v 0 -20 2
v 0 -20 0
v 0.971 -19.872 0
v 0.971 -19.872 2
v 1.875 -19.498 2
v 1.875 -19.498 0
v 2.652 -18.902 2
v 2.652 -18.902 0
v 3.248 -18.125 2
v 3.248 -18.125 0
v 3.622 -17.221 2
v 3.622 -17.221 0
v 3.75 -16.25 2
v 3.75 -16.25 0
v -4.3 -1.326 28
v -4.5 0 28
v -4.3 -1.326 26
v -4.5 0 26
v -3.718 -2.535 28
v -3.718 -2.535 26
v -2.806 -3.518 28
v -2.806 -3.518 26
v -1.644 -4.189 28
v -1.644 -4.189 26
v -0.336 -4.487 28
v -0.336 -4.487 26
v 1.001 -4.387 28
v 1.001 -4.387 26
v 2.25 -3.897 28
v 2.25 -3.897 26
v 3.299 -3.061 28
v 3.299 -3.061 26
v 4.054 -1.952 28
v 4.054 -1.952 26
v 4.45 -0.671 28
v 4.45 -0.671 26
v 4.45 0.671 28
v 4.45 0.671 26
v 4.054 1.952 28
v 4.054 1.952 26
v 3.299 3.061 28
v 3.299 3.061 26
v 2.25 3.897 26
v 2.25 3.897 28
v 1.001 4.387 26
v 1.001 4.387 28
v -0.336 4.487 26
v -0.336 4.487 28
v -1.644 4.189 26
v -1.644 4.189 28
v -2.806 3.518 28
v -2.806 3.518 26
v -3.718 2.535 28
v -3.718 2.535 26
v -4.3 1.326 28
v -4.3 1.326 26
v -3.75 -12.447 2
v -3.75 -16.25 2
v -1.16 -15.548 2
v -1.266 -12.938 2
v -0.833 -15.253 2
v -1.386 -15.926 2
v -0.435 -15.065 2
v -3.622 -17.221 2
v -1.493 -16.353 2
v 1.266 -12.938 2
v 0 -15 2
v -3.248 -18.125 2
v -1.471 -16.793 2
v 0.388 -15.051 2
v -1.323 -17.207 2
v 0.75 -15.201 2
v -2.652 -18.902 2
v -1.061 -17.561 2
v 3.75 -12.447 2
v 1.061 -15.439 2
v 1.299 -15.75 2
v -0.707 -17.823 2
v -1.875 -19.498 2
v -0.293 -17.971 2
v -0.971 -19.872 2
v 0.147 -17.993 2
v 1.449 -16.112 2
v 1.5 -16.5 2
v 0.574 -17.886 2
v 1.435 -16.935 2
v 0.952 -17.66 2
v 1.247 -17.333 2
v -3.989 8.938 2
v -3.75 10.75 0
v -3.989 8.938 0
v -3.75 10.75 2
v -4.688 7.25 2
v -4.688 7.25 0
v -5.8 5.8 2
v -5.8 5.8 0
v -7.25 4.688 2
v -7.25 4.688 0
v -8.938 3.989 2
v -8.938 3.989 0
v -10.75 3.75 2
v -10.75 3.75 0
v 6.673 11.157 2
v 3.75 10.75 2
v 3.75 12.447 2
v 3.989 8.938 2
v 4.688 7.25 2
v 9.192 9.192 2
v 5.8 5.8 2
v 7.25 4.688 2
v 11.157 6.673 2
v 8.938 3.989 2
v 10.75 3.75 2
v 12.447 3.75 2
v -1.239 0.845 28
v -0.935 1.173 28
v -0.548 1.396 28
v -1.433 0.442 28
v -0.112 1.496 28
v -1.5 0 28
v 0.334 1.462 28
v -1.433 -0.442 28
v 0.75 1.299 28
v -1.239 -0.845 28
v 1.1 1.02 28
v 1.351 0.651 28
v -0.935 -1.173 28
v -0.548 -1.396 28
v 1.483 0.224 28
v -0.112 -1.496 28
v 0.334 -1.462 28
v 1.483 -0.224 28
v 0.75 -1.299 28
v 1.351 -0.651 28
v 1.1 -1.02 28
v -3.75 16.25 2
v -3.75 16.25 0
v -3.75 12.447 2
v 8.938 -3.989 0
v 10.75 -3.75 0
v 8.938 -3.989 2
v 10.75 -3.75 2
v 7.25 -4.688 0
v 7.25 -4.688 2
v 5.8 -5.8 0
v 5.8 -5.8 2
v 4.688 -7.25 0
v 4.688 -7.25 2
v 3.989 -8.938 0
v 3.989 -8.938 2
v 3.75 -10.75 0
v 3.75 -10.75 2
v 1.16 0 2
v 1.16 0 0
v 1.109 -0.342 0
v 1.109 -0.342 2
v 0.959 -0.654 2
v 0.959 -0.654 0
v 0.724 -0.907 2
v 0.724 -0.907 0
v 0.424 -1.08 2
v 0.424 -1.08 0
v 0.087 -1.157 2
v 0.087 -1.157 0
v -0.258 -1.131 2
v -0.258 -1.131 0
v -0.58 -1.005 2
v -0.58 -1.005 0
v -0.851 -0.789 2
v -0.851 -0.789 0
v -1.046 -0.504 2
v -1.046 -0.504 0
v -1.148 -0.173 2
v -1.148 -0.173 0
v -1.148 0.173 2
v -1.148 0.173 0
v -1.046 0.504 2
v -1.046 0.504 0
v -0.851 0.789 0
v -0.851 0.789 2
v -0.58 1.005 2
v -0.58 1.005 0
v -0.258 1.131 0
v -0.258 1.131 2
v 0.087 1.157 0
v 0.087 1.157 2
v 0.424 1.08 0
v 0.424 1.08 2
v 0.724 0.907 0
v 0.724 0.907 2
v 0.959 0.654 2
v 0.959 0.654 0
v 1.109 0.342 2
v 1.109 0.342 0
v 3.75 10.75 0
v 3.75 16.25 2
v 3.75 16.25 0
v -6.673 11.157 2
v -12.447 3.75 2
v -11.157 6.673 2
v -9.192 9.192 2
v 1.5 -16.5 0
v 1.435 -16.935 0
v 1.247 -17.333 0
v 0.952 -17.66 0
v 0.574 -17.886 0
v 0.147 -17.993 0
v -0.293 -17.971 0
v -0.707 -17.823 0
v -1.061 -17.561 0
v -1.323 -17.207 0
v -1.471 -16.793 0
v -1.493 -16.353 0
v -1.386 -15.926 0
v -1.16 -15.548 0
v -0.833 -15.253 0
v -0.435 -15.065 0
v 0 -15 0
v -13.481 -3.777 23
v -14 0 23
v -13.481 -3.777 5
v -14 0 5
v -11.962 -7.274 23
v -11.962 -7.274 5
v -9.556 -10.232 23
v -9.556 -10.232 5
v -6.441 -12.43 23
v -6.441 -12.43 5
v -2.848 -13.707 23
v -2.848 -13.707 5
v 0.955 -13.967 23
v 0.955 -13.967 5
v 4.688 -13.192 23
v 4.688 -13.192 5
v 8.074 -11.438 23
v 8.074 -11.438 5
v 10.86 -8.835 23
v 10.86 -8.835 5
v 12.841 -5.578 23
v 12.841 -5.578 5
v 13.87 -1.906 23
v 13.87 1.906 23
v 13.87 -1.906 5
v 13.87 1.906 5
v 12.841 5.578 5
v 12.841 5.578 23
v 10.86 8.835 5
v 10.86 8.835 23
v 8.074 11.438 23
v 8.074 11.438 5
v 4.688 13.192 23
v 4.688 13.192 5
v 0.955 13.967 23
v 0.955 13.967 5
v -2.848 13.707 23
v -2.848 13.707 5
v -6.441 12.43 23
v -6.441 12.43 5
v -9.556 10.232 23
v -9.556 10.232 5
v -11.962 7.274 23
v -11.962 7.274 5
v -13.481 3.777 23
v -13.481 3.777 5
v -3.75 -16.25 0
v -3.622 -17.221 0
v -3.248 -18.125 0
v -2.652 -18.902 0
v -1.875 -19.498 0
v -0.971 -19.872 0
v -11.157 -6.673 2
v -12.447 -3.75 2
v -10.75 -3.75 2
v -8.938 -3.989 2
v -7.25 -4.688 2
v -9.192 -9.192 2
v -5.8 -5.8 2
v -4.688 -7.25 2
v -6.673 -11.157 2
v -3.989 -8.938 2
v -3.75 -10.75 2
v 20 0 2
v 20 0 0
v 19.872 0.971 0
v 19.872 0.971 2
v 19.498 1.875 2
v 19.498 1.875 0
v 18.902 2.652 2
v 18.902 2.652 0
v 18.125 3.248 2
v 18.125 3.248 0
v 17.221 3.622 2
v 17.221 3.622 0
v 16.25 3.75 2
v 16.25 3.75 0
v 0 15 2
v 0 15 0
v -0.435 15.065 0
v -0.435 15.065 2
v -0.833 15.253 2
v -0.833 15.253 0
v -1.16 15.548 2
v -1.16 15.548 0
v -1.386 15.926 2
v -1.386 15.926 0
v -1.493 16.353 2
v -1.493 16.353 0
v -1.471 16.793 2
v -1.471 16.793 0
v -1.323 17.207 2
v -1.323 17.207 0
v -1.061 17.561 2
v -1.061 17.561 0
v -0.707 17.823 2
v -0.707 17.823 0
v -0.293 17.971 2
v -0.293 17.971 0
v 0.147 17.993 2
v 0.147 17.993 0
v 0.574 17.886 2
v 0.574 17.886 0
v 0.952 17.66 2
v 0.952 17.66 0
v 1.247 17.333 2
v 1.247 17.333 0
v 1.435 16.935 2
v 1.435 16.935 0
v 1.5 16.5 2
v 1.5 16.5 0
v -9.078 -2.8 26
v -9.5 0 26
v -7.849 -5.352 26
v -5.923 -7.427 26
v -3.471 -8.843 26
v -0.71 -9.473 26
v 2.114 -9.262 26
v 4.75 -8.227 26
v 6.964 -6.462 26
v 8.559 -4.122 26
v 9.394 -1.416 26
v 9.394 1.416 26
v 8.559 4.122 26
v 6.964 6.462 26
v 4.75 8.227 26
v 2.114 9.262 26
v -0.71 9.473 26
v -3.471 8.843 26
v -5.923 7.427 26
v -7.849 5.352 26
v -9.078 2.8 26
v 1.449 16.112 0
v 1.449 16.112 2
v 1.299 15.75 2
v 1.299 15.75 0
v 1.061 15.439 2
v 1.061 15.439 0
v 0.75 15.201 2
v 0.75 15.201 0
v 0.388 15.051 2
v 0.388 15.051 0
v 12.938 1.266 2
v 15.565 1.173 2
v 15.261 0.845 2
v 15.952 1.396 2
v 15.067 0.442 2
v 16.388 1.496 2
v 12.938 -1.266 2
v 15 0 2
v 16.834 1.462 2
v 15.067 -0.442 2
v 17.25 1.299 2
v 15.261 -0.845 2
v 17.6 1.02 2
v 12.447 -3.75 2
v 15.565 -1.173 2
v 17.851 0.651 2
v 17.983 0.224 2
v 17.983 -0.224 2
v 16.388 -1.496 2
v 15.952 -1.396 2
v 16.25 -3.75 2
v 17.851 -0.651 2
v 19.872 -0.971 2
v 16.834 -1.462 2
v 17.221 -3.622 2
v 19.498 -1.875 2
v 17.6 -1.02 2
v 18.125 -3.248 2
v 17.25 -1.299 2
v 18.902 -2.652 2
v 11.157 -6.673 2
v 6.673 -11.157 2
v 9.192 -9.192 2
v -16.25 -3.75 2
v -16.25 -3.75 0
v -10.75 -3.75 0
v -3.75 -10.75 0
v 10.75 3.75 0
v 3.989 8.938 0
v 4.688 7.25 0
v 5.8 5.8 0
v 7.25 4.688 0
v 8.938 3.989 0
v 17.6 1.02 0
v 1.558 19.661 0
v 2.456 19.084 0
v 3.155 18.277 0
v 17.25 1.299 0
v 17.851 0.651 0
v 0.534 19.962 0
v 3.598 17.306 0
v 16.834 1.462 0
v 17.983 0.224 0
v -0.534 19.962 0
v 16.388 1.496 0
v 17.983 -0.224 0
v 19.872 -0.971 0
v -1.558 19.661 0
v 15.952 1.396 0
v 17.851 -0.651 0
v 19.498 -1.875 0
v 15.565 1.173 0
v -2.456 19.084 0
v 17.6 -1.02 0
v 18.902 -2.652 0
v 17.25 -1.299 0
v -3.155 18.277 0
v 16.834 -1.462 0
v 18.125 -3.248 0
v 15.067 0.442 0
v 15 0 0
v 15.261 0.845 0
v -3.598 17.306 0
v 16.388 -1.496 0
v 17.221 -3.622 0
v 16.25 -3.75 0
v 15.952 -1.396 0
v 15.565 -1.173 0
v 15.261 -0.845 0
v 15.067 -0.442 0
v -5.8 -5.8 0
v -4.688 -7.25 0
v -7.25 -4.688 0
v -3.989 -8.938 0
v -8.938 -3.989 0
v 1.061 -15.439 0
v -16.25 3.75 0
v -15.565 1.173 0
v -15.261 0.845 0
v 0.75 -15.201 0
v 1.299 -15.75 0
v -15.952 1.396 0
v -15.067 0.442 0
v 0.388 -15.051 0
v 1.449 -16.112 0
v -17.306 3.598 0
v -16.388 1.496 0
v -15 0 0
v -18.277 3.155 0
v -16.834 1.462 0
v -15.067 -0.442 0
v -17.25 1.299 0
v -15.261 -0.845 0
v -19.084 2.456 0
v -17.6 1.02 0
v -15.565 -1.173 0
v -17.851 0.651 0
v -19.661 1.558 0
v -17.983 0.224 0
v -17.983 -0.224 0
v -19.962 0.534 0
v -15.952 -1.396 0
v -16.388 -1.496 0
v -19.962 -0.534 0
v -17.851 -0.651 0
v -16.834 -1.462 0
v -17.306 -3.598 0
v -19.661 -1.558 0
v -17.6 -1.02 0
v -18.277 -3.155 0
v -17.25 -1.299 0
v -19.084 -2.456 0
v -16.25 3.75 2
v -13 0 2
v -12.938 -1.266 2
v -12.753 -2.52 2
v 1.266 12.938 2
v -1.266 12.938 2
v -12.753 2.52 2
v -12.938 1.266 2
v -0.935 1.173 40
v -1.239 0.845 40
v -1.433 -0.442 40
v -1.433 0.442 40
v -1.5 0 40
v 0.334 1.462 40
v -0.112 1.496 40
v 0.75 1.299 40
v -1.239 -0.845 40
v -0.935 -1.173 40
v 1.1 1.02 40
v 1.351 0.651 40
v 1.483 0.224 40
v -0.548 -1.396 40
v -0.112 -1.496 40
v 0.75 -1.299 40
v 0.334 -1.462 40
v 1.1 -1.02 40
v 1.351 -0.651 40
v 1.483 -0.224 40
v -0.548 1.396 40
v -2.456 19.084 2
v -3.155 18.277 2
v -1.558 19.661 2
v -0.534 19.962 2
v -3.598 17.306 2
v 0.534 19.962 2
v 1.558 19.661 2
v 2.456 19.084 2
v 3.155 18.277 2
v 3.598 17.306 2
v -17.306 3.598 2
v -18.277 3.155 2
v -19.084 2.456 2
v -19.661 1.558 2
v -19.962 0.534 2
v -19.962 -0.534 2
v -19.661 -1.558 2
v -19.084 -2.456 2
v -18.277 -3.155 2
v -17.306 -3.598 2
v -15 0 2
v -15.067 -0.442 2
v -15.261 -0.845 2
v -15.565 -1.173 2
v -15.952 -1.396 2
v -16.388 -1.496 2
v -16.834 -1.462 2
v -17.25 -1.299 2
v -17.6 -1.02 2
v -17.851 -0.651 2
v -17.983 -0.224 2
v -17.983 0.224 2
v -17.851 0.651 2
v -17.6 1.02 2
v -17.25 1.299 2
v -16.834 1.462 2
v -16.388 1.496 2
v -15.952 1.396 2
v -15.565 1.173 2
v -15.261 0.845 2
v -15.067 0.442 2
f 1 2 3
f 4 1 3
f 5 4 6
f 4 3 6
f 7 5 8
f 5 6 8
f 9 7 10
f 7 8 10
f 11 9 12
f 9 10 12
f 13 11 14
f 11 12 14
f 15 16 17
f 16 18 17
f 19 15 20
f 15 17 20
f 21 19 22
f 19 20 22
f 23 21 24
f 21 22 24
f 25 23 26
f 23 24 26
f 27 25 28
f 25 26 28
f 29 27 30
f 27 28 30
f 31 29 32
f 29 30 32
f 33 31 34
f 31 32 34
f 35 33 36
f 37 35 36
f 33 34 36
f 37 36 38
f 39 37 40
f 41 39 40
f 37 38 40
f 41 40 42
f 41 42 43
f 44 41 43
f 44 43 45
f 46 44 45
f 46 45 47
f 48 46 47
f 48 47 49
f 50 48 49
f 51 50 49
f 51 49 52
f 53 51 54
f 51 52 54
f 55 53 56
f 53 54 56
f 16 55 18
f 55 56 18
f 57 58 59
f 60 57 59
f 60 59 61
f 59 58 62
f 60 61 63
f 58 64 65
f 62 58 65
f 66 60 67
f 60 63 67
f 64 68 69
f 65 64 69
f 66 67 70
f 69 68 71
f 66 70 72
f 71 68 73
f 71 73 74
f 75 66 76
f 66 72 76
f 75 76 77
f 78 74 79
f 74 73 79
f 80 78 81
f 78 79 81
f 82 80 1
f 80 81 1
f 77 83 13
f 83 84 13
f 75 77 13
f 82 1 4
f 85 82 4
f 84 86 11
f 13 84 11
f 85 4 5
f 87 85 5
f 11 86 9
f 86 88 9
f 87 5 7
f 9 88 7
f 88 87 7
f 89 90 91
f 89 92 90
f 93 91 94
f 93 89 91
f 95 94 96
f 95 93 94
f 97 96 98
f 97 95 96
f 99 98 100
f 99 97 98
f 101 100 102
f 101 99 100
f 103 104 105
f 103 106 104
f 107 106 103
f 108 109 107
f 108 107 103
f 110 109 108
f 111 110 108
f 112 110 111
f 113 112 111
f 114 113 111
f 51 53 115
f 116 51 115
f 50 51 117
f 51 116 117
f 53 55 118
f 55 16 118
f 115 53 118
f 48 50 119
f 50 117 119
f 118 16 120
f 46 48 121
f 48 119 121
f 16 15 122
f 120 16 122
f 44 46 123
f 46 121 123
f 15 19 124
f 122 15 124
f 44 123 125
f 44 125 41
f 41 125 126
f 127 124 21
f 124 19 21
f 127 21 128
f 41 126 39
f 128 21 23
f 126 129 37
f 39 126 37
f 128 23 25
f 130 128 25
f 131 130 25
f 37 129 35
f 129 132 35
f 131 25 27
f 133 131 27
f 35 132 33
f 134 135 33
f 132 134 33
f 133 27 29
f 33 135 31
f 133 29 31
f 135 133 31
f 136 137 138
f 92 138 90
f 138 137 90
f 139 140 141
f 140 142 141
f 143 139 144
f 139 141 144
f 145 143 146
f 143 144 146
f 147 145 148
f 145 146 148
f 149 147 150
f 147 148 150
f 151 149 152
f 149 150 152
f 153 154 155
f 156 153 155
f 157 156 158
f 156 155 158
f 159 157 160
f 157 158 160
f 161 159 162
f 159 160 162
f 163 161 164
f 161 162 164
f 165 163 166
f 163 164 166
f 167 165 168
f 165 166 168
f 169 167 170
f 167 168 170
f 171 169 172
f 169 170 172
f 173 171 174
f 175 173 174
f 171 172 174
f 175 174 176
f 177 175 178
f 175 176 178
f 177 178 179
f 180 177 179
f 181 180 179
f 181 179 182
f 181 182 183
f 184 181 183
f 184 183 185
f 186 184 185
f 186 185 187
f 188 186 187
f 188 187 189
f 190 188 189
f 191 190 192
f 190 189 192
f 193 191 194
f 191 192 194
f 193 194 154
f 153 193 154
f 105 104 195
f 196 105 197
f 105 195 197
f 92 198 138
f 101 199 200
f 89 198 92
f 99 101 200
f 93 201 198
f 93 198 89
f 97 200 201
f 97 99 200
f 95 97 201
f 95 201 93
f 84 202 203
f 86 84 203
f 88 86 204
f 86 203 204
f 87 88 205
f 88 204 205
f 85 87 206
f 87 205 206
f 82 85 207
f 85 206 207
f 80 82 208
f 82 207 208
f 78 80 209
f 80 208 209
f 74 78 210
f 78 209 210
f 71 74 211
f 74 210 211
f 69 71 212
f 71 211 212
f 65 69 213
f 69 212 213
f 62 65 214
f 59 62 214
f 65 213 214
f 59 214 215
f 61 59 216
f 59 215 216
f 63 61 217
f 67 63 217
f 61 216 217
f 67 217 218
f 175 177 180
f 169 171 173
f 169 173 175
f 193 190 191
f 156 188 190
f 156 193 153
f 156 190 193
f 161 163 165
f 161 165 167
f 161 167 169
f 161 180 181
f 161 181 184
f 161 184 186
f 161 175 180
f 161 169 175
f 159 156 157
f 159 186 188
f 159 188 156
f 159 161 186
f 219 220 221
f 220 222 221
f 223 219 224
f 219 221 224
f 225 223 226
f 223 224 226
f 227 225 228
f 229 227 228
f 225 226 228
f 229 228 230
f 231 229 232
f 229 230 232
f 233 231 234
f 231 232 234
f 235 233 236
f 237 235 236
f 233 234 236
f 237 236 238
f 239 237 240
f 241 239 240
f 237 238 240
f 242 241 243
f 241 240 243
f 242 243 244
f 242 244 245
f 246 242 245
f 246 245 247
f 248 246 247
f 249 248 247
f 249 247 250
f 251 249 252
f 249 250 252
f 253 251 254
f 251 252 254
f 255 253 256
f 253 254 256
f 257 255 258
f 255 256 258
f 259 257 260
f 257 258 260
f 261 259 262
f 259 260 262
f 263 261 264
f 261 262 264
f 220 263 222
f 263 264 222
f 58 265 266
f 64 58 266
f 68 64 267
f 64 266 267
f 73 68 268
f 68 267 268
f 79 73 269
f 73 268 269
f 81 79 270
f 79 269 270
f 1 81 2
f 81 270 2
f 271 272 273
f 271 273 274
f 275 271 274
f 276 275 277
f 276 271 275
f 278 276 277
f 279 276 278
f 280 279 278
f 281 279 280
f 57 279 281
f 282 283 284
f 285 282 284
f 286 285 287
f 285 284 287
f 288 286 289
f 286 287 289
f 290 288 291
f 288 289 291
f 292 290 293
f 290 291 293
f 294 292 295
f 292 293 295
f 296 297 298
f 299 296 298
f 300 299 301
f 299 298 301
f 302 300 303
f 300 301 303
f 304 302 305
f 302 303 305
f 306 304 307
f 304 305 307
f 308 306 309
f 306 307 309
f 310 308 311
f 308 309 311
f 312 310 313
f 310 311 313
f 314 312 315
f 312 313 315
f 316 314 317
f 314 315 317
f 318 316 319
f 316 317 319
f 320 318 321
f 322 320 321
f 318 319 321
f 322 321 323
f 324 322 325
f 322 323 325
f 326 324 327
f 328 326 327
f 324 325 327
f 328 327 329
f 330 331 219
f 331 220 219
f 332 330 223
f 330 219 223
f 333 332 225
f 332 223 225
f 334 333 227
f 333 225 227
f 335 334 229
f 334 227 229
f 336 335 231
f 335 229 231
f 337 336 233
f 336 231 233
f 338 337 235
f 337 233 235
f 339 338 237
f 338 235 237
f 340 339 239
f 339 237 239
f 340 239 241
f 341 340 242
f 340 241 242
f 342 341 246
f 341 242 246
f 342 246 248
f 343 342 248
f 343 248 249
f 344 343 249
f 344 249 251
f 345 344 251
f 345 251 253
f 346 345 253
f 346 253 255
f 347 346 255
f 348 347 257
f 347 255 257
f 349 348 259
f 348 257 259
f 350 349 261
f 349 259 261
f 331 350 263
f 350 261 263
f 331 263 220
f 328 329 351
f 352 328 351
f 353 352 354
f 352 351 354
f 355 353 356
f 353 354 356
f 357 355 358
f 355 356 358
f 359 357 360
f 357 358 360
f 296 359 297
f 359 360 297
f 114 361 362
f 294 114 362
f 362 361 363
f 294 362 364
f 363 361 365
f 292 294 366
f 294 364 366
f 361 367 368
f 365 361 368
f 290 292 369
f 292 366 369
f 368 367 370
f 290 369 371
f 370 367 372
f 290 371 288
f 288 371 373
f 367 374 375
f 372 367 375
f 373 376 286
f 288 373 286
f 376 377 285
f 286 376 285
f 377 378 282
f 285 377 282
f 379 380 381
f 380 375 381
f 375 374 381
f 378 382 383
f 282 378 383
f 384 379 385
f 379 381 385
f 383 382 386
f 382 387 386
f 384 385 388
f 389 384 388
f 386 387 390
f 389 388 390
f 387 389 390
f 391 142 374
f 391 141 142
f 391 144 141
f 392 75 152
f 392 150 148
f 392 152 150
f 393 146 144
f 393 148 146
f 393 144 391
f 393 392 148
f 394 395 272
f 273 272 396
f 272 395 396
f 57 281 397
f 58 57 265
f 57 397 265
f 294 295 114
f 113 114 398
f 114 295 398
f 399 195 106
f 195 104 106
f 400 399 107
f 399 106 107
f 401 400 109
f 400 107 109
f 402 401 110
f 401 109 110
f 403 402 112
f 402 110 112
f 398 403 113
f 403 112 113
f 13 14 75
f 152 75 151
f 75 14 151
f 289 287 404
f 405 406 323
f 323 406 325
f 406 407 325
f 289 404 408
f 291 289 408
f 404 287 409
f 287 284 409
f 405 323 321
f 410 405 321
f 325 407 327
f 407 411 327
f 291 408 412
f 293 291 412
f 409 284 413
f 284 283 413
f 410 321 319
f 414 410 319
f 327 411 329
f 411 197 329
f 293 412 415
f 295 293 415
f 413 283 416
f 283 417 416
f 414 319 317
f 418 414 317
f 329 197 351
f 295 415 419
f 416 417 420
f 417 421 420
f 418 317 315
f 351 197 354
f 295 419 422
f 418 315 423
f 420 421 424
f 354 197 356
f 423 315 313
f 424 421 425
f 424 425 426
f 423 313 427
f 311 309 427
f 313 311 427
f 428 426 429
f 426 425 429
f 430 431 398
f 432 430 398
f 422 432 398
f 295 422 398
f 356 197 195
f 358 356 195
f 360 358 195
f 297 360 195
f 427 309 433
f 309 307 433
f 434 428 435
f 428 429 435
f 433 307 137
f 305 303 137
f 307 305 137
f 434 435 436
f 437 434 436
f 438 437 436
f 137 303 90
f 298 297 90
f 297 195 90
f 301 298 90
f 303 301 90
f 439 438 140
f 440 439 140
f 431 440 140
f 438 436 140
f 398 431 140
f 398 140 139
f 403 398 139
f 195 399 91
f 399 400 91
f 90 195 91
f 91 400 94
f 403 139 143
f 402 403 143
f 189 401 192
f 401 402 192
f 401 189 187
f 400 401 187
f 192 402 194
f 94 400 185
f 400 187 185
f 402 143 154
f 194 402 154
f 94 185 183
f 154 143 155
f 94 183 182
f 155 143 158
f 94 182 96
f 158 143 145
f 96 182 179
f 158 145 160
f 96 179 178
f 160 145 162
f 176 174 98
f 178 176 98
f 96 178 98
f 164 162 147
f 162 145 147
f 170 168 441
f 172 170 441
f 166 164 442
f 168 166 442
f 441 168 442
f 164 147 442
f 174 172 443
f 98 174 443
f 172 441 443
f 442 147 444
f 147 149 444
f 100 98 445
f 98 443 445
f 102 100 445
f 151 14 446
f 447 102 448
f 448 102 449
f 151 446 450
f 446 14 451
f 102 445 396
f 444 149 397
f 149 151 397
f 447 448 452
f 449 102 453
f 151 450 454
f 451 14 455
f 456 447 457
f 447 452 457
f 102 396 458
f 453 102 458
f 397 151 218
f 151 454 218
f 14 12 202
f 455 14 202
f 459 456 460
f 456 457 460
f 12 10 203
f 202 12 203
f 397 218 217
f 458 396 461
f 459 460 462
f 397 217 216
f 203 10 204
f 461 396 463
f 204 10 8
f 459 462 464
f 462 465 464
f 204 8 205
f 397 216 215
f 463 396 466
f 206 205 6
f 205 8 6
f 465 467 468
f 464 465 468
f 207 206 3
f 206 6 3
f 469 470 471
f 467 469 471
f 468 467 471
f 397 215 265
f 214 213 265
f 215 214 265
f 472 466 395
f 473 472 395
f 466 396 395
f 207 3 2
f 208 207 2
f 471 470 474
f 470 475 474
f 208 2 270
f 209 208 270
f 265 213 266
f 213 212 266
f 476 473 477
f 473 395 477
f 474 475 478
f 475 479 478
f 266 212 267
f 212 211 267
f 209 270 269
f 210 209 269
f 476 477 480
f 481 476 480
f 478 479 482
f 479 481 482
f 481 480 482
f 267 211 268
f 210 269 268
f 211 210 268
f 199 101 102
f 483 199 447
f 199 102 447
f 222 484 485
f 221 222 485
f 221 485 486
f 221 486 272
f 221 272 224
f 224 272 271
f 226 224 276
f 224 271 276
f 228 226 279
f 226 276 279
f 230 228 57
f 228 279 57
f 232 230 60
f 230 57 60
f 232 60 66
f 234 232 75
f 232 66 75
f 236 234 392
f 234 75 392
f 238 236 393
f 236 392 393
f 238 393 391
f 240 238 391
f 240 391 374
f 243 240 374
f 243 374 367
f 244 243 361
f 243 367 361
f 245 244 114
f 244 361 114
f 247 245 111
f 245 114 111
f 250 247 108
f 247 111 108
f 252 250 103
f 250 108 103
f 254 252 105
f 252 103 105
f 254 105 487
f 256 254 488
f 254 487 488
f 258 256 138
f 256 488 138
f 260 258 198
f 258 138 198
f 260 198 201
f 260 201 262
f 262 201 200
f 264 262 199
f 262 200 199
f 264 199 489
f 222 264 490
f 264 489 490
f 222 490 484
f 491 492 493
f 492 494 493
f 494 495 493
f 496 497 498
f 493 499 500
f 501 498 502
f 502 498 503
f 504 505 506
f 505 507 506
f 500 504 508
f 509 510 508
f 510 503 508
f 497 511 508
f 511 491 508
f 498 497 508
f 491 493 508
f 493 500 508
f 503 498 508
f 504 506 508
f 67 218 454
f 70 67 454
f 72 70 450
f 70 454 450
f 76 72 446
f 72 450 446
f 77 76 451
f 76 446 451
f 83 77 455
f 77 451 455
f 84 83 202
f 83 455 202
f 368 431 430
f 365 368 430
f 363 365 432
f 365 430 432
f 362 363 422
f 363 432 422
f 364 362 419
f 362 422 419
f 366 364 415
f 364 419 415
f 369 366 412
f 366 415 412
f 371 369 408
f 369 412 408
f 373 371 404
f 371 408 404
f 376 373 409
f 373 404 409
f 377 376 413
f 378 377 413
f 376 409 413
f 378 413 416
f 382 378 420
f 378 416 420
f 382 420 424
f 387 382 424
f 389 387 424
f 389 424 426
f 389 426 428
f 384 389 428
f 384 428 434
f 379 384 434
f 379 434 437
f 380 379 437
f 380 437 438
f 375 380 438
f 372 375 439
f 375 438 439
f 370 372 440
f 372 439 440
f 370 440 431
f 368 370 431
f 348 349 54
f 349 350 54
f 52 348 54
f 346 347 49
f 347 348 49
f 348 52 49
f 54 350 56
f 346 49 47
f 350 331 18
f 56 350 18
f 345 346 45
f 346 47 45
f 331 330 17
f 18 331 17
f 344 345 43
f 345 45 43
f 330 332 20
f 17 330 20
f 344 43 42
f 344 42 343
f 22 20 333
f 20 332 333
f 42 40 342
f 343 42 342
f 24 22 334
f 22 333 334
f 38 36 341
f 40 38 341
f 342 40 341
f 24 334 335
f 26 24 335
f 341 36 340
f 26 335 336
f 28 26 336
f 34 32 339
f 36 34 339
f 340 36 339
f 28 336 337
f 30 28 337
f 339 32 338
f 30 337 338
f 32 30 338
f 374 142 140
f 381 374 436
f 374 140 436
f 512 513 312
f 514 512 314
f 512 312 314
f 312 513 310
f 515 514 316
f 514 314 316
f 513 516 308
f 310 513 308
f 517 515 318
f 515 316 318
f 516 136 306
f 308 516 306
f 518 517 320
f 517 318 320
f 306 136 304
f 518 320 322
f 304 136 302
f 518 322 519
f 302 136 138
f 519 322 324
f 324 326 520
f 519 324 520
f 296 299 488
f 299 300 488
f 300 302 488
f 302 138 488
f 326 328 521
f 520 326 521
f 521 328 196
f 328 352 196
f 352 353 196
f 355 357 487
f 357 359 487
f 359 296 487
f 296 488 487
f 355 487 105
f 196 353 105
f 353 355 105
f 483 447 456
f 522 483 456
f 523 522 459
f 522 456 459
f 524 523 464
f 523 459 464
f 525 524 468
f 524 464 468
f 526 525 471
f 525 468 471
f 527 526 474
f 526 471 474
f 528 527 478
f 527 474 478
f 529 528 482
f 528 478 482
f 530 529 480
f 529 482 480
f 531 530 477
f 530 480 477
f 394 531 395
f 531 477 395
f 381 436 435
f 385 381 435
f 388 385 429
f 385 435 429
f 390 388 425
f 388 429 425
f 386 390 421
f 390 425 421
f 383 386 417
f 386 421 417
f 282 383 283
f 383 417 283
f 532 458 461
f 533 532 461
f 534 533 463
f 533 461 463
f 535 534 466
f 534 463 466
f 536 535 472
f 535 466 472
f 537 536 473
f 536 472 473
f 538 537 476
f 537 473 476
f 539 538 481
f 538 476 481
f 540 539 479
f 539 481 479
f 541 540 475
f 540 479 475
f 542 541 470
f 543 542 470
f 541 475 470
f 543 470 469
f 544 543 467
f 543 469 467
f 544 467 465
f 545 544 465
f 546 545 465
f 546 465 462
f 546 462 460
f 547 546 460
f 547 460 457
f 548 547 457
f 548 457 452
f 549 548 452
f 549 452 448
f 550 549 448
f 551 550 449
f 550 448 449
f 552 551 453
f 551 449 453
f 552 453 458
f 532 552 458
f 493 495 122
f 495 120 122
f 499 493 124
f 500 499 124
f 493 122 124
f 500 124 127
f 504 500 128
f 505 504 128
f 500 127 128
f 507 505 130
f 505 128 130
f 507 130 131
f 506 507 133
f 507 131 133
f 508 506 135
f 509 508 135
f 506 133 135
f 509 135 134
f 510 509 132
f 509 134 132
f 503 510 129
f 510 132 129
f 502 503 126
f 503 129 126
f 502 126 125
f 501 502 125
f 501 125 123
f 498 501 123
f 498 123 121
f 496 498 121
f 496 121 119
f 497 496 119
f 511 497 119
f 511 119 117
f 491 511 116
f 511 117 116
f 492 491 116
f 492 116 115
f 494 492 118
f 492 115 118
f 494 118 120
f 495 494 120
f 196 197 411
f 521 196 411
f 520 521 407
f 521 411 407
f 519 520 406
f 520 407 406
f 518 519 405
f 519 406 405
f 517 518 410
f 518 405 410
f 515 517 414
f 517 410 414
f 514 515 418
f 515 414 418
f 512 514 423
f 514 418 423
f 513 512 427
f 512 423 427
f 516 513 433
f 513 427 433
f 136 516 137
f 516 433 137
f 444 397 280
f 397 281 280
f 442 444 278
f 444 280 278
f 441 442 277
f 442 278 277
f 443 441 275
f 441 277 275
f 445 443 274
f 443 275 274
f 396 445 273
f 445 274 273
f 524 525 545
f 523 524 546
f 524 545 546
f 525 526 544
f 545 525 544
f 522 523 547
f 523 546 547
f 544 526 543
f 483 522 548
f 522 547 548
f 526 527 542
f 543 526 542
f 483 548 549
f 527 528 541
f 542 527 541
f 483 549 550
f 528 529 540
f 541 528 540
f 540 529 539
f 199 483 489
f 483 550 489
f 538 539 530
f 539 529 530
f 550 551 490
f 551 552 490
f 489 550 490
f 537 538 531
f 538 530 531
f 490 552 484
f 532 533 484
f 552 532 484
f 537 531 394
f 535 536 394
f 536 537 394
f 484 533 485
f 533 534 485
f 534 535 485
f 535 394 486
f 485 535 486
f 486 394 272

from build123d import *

# Parameters (mm, degrees)
F3_DEPTH = 2
F4_R     = 7
F2_R     = 1.1604986379
F5_DEPTH = 2
F6_R     = 1.5
F7_DEPTH = 2


with BuildPart() as f1:
    # F0 (on Front) → F1 (revolve)
    with BuildSketch(Plane.XZ):
        Polygon((-20, 0), (0, 0), (0, 40), (-1.5, 40), (-1.5, 28), (-4.5, 28), (-4.5, 26), (-9.5, 26), (-14, 23), (-14, 5), (-13, 2), (-20, 2), align=None)
    revolve(axis=Axis((0, 0, 20), (0, 0, 1)))

    # F2 (on face) → F3 (cut)
    with BuildSketch(Plane(origin=(0, 0, 0), x_dir=(1, 0, 0), z_dir=(0, 0, -1))):
        with BuildLine():
            Line((-3.75, 3.75), (-3.75, 16.25))
            ThreePointArc((-3.75, 16.25), (-2.6516504294, 18.9016504294), (0, 20))
            ThreePointArc((0, 20), (-14.1421355915, 14.1421356559), (-20, 9.1e-08))
            ThreePointArc((-20, 9.1e-08), (-18.9016503973, 2.6516504616), (-16.25, 3.75))
            Line((-16.25, 3.75), (-3.75, 3.75))
        make_face()
        with BuildLine():
            ThreePointArc((0, 20), (2.6516504294, 18.9016504294), (3.75, 16.25))
            Line((3.75, 16.25), (3.75, 3.75))
            Line((3.75, 3.75), (16.25, 3.75))
            ThreePointArc((16.25, 3.75), (18.9016504294, 2.6516504294), (20, 0))
            ThreePointArc((20, 0), (14.1421356237, 14.1421356237), (0, 20))
        make_face()
        with BuildLine():
            ThreePointArc((-2.95e-08, -20), (14.1421356133, -14.1421356341), (20, 0))
            ThreePointArc((20, 0), (18.9016504294, -2.6516504294), (16.25, -3.75))
            Line((16.25, -3.75), (3.75, -3.75))
            Line((3.75, -3.75), (3.75, -16.25))
            ThreePointArc((3.75, -16.25), (2.651650419, -18.9016504399), (-2.95e-08, -20))
        make_face()
        with BuildLine():
            ThreePointArc((-16.25, -3.75), (-18.9016504616, -2.6516503973), (-20, 9.1e-08))
            ThreePointArc((-20, 9.1e-08), (-14.1421356663, -14.1421355811), (-2.95e-08, -20))
            ThreePointArc((-2.95e-08, -20), (-2.6516504399, -18.901650419), (-3.75, -16.25))
            Line((-3.75, -16.25), (-3.75, -3.75))
            Line((-3.75, -3.75), (-16.25, -3.75))
        make_face()
    extrude(amount=-F3_DEPTH, mode=Mode.SUBTRACT)

    # F4
    f4_edges = [f1.edges().sort_by_distance(p)[0] for p in [
        (3.75, 3.75, 1),
        (-3.75, 3.75, 1),
        (-3.75, -3.75, 1),
        (3.75, -3.75, 1),
    ]]
    fillet(f4_edges, radius=F4_R)

    # F2 (on face) → F5 (cut)
    with BuildSketch(Plane(origin=(0, 0, 0), x_dir=(1, 0, 0), z_dir=(0, 0, -1))):
        Circle(F2_R)
    extrude(amount=-F5_DEPTH, mode=Mode.SUBTRACT)

    # F6 (on face) → F7 (cut)
    with BuildSketch(Plane(origin=(0, 0, 0), x_dir=(1, 0, 0), z_dir=(0, 0, -1))):
        with BuildLine():
            ThreePointArc((1.5, 16.5), (-1.0606601718, 17.5606601718), (0, 15))
            ThreePointArc((0, 15), (1.0606601718, 15.4393398282), (1.5, 16.5))
        make_face()
        with Locations((-16.5, 0)):
            Circle(F6_R)
        with BuildLine():
            ThreePointArc((1.5, -16.5), (1.0606601718, -15.4393398282), (0, -15))
            ThreePointArc((0, -15), (-1.0606601718, -17.5606601718), (1.5, -16.5))
        make_face()
        with BuildLine():
            ThreePointArc((18, 0), (16.5, 1.5), (15, 0))
            ThreePointArc((15, 0), (16.5, -1.5), (18, 0))
        make_face()
    extrude(amount=-F7_DEPTH, mode=Mode.SUBTRACT)


solid = f1.part
